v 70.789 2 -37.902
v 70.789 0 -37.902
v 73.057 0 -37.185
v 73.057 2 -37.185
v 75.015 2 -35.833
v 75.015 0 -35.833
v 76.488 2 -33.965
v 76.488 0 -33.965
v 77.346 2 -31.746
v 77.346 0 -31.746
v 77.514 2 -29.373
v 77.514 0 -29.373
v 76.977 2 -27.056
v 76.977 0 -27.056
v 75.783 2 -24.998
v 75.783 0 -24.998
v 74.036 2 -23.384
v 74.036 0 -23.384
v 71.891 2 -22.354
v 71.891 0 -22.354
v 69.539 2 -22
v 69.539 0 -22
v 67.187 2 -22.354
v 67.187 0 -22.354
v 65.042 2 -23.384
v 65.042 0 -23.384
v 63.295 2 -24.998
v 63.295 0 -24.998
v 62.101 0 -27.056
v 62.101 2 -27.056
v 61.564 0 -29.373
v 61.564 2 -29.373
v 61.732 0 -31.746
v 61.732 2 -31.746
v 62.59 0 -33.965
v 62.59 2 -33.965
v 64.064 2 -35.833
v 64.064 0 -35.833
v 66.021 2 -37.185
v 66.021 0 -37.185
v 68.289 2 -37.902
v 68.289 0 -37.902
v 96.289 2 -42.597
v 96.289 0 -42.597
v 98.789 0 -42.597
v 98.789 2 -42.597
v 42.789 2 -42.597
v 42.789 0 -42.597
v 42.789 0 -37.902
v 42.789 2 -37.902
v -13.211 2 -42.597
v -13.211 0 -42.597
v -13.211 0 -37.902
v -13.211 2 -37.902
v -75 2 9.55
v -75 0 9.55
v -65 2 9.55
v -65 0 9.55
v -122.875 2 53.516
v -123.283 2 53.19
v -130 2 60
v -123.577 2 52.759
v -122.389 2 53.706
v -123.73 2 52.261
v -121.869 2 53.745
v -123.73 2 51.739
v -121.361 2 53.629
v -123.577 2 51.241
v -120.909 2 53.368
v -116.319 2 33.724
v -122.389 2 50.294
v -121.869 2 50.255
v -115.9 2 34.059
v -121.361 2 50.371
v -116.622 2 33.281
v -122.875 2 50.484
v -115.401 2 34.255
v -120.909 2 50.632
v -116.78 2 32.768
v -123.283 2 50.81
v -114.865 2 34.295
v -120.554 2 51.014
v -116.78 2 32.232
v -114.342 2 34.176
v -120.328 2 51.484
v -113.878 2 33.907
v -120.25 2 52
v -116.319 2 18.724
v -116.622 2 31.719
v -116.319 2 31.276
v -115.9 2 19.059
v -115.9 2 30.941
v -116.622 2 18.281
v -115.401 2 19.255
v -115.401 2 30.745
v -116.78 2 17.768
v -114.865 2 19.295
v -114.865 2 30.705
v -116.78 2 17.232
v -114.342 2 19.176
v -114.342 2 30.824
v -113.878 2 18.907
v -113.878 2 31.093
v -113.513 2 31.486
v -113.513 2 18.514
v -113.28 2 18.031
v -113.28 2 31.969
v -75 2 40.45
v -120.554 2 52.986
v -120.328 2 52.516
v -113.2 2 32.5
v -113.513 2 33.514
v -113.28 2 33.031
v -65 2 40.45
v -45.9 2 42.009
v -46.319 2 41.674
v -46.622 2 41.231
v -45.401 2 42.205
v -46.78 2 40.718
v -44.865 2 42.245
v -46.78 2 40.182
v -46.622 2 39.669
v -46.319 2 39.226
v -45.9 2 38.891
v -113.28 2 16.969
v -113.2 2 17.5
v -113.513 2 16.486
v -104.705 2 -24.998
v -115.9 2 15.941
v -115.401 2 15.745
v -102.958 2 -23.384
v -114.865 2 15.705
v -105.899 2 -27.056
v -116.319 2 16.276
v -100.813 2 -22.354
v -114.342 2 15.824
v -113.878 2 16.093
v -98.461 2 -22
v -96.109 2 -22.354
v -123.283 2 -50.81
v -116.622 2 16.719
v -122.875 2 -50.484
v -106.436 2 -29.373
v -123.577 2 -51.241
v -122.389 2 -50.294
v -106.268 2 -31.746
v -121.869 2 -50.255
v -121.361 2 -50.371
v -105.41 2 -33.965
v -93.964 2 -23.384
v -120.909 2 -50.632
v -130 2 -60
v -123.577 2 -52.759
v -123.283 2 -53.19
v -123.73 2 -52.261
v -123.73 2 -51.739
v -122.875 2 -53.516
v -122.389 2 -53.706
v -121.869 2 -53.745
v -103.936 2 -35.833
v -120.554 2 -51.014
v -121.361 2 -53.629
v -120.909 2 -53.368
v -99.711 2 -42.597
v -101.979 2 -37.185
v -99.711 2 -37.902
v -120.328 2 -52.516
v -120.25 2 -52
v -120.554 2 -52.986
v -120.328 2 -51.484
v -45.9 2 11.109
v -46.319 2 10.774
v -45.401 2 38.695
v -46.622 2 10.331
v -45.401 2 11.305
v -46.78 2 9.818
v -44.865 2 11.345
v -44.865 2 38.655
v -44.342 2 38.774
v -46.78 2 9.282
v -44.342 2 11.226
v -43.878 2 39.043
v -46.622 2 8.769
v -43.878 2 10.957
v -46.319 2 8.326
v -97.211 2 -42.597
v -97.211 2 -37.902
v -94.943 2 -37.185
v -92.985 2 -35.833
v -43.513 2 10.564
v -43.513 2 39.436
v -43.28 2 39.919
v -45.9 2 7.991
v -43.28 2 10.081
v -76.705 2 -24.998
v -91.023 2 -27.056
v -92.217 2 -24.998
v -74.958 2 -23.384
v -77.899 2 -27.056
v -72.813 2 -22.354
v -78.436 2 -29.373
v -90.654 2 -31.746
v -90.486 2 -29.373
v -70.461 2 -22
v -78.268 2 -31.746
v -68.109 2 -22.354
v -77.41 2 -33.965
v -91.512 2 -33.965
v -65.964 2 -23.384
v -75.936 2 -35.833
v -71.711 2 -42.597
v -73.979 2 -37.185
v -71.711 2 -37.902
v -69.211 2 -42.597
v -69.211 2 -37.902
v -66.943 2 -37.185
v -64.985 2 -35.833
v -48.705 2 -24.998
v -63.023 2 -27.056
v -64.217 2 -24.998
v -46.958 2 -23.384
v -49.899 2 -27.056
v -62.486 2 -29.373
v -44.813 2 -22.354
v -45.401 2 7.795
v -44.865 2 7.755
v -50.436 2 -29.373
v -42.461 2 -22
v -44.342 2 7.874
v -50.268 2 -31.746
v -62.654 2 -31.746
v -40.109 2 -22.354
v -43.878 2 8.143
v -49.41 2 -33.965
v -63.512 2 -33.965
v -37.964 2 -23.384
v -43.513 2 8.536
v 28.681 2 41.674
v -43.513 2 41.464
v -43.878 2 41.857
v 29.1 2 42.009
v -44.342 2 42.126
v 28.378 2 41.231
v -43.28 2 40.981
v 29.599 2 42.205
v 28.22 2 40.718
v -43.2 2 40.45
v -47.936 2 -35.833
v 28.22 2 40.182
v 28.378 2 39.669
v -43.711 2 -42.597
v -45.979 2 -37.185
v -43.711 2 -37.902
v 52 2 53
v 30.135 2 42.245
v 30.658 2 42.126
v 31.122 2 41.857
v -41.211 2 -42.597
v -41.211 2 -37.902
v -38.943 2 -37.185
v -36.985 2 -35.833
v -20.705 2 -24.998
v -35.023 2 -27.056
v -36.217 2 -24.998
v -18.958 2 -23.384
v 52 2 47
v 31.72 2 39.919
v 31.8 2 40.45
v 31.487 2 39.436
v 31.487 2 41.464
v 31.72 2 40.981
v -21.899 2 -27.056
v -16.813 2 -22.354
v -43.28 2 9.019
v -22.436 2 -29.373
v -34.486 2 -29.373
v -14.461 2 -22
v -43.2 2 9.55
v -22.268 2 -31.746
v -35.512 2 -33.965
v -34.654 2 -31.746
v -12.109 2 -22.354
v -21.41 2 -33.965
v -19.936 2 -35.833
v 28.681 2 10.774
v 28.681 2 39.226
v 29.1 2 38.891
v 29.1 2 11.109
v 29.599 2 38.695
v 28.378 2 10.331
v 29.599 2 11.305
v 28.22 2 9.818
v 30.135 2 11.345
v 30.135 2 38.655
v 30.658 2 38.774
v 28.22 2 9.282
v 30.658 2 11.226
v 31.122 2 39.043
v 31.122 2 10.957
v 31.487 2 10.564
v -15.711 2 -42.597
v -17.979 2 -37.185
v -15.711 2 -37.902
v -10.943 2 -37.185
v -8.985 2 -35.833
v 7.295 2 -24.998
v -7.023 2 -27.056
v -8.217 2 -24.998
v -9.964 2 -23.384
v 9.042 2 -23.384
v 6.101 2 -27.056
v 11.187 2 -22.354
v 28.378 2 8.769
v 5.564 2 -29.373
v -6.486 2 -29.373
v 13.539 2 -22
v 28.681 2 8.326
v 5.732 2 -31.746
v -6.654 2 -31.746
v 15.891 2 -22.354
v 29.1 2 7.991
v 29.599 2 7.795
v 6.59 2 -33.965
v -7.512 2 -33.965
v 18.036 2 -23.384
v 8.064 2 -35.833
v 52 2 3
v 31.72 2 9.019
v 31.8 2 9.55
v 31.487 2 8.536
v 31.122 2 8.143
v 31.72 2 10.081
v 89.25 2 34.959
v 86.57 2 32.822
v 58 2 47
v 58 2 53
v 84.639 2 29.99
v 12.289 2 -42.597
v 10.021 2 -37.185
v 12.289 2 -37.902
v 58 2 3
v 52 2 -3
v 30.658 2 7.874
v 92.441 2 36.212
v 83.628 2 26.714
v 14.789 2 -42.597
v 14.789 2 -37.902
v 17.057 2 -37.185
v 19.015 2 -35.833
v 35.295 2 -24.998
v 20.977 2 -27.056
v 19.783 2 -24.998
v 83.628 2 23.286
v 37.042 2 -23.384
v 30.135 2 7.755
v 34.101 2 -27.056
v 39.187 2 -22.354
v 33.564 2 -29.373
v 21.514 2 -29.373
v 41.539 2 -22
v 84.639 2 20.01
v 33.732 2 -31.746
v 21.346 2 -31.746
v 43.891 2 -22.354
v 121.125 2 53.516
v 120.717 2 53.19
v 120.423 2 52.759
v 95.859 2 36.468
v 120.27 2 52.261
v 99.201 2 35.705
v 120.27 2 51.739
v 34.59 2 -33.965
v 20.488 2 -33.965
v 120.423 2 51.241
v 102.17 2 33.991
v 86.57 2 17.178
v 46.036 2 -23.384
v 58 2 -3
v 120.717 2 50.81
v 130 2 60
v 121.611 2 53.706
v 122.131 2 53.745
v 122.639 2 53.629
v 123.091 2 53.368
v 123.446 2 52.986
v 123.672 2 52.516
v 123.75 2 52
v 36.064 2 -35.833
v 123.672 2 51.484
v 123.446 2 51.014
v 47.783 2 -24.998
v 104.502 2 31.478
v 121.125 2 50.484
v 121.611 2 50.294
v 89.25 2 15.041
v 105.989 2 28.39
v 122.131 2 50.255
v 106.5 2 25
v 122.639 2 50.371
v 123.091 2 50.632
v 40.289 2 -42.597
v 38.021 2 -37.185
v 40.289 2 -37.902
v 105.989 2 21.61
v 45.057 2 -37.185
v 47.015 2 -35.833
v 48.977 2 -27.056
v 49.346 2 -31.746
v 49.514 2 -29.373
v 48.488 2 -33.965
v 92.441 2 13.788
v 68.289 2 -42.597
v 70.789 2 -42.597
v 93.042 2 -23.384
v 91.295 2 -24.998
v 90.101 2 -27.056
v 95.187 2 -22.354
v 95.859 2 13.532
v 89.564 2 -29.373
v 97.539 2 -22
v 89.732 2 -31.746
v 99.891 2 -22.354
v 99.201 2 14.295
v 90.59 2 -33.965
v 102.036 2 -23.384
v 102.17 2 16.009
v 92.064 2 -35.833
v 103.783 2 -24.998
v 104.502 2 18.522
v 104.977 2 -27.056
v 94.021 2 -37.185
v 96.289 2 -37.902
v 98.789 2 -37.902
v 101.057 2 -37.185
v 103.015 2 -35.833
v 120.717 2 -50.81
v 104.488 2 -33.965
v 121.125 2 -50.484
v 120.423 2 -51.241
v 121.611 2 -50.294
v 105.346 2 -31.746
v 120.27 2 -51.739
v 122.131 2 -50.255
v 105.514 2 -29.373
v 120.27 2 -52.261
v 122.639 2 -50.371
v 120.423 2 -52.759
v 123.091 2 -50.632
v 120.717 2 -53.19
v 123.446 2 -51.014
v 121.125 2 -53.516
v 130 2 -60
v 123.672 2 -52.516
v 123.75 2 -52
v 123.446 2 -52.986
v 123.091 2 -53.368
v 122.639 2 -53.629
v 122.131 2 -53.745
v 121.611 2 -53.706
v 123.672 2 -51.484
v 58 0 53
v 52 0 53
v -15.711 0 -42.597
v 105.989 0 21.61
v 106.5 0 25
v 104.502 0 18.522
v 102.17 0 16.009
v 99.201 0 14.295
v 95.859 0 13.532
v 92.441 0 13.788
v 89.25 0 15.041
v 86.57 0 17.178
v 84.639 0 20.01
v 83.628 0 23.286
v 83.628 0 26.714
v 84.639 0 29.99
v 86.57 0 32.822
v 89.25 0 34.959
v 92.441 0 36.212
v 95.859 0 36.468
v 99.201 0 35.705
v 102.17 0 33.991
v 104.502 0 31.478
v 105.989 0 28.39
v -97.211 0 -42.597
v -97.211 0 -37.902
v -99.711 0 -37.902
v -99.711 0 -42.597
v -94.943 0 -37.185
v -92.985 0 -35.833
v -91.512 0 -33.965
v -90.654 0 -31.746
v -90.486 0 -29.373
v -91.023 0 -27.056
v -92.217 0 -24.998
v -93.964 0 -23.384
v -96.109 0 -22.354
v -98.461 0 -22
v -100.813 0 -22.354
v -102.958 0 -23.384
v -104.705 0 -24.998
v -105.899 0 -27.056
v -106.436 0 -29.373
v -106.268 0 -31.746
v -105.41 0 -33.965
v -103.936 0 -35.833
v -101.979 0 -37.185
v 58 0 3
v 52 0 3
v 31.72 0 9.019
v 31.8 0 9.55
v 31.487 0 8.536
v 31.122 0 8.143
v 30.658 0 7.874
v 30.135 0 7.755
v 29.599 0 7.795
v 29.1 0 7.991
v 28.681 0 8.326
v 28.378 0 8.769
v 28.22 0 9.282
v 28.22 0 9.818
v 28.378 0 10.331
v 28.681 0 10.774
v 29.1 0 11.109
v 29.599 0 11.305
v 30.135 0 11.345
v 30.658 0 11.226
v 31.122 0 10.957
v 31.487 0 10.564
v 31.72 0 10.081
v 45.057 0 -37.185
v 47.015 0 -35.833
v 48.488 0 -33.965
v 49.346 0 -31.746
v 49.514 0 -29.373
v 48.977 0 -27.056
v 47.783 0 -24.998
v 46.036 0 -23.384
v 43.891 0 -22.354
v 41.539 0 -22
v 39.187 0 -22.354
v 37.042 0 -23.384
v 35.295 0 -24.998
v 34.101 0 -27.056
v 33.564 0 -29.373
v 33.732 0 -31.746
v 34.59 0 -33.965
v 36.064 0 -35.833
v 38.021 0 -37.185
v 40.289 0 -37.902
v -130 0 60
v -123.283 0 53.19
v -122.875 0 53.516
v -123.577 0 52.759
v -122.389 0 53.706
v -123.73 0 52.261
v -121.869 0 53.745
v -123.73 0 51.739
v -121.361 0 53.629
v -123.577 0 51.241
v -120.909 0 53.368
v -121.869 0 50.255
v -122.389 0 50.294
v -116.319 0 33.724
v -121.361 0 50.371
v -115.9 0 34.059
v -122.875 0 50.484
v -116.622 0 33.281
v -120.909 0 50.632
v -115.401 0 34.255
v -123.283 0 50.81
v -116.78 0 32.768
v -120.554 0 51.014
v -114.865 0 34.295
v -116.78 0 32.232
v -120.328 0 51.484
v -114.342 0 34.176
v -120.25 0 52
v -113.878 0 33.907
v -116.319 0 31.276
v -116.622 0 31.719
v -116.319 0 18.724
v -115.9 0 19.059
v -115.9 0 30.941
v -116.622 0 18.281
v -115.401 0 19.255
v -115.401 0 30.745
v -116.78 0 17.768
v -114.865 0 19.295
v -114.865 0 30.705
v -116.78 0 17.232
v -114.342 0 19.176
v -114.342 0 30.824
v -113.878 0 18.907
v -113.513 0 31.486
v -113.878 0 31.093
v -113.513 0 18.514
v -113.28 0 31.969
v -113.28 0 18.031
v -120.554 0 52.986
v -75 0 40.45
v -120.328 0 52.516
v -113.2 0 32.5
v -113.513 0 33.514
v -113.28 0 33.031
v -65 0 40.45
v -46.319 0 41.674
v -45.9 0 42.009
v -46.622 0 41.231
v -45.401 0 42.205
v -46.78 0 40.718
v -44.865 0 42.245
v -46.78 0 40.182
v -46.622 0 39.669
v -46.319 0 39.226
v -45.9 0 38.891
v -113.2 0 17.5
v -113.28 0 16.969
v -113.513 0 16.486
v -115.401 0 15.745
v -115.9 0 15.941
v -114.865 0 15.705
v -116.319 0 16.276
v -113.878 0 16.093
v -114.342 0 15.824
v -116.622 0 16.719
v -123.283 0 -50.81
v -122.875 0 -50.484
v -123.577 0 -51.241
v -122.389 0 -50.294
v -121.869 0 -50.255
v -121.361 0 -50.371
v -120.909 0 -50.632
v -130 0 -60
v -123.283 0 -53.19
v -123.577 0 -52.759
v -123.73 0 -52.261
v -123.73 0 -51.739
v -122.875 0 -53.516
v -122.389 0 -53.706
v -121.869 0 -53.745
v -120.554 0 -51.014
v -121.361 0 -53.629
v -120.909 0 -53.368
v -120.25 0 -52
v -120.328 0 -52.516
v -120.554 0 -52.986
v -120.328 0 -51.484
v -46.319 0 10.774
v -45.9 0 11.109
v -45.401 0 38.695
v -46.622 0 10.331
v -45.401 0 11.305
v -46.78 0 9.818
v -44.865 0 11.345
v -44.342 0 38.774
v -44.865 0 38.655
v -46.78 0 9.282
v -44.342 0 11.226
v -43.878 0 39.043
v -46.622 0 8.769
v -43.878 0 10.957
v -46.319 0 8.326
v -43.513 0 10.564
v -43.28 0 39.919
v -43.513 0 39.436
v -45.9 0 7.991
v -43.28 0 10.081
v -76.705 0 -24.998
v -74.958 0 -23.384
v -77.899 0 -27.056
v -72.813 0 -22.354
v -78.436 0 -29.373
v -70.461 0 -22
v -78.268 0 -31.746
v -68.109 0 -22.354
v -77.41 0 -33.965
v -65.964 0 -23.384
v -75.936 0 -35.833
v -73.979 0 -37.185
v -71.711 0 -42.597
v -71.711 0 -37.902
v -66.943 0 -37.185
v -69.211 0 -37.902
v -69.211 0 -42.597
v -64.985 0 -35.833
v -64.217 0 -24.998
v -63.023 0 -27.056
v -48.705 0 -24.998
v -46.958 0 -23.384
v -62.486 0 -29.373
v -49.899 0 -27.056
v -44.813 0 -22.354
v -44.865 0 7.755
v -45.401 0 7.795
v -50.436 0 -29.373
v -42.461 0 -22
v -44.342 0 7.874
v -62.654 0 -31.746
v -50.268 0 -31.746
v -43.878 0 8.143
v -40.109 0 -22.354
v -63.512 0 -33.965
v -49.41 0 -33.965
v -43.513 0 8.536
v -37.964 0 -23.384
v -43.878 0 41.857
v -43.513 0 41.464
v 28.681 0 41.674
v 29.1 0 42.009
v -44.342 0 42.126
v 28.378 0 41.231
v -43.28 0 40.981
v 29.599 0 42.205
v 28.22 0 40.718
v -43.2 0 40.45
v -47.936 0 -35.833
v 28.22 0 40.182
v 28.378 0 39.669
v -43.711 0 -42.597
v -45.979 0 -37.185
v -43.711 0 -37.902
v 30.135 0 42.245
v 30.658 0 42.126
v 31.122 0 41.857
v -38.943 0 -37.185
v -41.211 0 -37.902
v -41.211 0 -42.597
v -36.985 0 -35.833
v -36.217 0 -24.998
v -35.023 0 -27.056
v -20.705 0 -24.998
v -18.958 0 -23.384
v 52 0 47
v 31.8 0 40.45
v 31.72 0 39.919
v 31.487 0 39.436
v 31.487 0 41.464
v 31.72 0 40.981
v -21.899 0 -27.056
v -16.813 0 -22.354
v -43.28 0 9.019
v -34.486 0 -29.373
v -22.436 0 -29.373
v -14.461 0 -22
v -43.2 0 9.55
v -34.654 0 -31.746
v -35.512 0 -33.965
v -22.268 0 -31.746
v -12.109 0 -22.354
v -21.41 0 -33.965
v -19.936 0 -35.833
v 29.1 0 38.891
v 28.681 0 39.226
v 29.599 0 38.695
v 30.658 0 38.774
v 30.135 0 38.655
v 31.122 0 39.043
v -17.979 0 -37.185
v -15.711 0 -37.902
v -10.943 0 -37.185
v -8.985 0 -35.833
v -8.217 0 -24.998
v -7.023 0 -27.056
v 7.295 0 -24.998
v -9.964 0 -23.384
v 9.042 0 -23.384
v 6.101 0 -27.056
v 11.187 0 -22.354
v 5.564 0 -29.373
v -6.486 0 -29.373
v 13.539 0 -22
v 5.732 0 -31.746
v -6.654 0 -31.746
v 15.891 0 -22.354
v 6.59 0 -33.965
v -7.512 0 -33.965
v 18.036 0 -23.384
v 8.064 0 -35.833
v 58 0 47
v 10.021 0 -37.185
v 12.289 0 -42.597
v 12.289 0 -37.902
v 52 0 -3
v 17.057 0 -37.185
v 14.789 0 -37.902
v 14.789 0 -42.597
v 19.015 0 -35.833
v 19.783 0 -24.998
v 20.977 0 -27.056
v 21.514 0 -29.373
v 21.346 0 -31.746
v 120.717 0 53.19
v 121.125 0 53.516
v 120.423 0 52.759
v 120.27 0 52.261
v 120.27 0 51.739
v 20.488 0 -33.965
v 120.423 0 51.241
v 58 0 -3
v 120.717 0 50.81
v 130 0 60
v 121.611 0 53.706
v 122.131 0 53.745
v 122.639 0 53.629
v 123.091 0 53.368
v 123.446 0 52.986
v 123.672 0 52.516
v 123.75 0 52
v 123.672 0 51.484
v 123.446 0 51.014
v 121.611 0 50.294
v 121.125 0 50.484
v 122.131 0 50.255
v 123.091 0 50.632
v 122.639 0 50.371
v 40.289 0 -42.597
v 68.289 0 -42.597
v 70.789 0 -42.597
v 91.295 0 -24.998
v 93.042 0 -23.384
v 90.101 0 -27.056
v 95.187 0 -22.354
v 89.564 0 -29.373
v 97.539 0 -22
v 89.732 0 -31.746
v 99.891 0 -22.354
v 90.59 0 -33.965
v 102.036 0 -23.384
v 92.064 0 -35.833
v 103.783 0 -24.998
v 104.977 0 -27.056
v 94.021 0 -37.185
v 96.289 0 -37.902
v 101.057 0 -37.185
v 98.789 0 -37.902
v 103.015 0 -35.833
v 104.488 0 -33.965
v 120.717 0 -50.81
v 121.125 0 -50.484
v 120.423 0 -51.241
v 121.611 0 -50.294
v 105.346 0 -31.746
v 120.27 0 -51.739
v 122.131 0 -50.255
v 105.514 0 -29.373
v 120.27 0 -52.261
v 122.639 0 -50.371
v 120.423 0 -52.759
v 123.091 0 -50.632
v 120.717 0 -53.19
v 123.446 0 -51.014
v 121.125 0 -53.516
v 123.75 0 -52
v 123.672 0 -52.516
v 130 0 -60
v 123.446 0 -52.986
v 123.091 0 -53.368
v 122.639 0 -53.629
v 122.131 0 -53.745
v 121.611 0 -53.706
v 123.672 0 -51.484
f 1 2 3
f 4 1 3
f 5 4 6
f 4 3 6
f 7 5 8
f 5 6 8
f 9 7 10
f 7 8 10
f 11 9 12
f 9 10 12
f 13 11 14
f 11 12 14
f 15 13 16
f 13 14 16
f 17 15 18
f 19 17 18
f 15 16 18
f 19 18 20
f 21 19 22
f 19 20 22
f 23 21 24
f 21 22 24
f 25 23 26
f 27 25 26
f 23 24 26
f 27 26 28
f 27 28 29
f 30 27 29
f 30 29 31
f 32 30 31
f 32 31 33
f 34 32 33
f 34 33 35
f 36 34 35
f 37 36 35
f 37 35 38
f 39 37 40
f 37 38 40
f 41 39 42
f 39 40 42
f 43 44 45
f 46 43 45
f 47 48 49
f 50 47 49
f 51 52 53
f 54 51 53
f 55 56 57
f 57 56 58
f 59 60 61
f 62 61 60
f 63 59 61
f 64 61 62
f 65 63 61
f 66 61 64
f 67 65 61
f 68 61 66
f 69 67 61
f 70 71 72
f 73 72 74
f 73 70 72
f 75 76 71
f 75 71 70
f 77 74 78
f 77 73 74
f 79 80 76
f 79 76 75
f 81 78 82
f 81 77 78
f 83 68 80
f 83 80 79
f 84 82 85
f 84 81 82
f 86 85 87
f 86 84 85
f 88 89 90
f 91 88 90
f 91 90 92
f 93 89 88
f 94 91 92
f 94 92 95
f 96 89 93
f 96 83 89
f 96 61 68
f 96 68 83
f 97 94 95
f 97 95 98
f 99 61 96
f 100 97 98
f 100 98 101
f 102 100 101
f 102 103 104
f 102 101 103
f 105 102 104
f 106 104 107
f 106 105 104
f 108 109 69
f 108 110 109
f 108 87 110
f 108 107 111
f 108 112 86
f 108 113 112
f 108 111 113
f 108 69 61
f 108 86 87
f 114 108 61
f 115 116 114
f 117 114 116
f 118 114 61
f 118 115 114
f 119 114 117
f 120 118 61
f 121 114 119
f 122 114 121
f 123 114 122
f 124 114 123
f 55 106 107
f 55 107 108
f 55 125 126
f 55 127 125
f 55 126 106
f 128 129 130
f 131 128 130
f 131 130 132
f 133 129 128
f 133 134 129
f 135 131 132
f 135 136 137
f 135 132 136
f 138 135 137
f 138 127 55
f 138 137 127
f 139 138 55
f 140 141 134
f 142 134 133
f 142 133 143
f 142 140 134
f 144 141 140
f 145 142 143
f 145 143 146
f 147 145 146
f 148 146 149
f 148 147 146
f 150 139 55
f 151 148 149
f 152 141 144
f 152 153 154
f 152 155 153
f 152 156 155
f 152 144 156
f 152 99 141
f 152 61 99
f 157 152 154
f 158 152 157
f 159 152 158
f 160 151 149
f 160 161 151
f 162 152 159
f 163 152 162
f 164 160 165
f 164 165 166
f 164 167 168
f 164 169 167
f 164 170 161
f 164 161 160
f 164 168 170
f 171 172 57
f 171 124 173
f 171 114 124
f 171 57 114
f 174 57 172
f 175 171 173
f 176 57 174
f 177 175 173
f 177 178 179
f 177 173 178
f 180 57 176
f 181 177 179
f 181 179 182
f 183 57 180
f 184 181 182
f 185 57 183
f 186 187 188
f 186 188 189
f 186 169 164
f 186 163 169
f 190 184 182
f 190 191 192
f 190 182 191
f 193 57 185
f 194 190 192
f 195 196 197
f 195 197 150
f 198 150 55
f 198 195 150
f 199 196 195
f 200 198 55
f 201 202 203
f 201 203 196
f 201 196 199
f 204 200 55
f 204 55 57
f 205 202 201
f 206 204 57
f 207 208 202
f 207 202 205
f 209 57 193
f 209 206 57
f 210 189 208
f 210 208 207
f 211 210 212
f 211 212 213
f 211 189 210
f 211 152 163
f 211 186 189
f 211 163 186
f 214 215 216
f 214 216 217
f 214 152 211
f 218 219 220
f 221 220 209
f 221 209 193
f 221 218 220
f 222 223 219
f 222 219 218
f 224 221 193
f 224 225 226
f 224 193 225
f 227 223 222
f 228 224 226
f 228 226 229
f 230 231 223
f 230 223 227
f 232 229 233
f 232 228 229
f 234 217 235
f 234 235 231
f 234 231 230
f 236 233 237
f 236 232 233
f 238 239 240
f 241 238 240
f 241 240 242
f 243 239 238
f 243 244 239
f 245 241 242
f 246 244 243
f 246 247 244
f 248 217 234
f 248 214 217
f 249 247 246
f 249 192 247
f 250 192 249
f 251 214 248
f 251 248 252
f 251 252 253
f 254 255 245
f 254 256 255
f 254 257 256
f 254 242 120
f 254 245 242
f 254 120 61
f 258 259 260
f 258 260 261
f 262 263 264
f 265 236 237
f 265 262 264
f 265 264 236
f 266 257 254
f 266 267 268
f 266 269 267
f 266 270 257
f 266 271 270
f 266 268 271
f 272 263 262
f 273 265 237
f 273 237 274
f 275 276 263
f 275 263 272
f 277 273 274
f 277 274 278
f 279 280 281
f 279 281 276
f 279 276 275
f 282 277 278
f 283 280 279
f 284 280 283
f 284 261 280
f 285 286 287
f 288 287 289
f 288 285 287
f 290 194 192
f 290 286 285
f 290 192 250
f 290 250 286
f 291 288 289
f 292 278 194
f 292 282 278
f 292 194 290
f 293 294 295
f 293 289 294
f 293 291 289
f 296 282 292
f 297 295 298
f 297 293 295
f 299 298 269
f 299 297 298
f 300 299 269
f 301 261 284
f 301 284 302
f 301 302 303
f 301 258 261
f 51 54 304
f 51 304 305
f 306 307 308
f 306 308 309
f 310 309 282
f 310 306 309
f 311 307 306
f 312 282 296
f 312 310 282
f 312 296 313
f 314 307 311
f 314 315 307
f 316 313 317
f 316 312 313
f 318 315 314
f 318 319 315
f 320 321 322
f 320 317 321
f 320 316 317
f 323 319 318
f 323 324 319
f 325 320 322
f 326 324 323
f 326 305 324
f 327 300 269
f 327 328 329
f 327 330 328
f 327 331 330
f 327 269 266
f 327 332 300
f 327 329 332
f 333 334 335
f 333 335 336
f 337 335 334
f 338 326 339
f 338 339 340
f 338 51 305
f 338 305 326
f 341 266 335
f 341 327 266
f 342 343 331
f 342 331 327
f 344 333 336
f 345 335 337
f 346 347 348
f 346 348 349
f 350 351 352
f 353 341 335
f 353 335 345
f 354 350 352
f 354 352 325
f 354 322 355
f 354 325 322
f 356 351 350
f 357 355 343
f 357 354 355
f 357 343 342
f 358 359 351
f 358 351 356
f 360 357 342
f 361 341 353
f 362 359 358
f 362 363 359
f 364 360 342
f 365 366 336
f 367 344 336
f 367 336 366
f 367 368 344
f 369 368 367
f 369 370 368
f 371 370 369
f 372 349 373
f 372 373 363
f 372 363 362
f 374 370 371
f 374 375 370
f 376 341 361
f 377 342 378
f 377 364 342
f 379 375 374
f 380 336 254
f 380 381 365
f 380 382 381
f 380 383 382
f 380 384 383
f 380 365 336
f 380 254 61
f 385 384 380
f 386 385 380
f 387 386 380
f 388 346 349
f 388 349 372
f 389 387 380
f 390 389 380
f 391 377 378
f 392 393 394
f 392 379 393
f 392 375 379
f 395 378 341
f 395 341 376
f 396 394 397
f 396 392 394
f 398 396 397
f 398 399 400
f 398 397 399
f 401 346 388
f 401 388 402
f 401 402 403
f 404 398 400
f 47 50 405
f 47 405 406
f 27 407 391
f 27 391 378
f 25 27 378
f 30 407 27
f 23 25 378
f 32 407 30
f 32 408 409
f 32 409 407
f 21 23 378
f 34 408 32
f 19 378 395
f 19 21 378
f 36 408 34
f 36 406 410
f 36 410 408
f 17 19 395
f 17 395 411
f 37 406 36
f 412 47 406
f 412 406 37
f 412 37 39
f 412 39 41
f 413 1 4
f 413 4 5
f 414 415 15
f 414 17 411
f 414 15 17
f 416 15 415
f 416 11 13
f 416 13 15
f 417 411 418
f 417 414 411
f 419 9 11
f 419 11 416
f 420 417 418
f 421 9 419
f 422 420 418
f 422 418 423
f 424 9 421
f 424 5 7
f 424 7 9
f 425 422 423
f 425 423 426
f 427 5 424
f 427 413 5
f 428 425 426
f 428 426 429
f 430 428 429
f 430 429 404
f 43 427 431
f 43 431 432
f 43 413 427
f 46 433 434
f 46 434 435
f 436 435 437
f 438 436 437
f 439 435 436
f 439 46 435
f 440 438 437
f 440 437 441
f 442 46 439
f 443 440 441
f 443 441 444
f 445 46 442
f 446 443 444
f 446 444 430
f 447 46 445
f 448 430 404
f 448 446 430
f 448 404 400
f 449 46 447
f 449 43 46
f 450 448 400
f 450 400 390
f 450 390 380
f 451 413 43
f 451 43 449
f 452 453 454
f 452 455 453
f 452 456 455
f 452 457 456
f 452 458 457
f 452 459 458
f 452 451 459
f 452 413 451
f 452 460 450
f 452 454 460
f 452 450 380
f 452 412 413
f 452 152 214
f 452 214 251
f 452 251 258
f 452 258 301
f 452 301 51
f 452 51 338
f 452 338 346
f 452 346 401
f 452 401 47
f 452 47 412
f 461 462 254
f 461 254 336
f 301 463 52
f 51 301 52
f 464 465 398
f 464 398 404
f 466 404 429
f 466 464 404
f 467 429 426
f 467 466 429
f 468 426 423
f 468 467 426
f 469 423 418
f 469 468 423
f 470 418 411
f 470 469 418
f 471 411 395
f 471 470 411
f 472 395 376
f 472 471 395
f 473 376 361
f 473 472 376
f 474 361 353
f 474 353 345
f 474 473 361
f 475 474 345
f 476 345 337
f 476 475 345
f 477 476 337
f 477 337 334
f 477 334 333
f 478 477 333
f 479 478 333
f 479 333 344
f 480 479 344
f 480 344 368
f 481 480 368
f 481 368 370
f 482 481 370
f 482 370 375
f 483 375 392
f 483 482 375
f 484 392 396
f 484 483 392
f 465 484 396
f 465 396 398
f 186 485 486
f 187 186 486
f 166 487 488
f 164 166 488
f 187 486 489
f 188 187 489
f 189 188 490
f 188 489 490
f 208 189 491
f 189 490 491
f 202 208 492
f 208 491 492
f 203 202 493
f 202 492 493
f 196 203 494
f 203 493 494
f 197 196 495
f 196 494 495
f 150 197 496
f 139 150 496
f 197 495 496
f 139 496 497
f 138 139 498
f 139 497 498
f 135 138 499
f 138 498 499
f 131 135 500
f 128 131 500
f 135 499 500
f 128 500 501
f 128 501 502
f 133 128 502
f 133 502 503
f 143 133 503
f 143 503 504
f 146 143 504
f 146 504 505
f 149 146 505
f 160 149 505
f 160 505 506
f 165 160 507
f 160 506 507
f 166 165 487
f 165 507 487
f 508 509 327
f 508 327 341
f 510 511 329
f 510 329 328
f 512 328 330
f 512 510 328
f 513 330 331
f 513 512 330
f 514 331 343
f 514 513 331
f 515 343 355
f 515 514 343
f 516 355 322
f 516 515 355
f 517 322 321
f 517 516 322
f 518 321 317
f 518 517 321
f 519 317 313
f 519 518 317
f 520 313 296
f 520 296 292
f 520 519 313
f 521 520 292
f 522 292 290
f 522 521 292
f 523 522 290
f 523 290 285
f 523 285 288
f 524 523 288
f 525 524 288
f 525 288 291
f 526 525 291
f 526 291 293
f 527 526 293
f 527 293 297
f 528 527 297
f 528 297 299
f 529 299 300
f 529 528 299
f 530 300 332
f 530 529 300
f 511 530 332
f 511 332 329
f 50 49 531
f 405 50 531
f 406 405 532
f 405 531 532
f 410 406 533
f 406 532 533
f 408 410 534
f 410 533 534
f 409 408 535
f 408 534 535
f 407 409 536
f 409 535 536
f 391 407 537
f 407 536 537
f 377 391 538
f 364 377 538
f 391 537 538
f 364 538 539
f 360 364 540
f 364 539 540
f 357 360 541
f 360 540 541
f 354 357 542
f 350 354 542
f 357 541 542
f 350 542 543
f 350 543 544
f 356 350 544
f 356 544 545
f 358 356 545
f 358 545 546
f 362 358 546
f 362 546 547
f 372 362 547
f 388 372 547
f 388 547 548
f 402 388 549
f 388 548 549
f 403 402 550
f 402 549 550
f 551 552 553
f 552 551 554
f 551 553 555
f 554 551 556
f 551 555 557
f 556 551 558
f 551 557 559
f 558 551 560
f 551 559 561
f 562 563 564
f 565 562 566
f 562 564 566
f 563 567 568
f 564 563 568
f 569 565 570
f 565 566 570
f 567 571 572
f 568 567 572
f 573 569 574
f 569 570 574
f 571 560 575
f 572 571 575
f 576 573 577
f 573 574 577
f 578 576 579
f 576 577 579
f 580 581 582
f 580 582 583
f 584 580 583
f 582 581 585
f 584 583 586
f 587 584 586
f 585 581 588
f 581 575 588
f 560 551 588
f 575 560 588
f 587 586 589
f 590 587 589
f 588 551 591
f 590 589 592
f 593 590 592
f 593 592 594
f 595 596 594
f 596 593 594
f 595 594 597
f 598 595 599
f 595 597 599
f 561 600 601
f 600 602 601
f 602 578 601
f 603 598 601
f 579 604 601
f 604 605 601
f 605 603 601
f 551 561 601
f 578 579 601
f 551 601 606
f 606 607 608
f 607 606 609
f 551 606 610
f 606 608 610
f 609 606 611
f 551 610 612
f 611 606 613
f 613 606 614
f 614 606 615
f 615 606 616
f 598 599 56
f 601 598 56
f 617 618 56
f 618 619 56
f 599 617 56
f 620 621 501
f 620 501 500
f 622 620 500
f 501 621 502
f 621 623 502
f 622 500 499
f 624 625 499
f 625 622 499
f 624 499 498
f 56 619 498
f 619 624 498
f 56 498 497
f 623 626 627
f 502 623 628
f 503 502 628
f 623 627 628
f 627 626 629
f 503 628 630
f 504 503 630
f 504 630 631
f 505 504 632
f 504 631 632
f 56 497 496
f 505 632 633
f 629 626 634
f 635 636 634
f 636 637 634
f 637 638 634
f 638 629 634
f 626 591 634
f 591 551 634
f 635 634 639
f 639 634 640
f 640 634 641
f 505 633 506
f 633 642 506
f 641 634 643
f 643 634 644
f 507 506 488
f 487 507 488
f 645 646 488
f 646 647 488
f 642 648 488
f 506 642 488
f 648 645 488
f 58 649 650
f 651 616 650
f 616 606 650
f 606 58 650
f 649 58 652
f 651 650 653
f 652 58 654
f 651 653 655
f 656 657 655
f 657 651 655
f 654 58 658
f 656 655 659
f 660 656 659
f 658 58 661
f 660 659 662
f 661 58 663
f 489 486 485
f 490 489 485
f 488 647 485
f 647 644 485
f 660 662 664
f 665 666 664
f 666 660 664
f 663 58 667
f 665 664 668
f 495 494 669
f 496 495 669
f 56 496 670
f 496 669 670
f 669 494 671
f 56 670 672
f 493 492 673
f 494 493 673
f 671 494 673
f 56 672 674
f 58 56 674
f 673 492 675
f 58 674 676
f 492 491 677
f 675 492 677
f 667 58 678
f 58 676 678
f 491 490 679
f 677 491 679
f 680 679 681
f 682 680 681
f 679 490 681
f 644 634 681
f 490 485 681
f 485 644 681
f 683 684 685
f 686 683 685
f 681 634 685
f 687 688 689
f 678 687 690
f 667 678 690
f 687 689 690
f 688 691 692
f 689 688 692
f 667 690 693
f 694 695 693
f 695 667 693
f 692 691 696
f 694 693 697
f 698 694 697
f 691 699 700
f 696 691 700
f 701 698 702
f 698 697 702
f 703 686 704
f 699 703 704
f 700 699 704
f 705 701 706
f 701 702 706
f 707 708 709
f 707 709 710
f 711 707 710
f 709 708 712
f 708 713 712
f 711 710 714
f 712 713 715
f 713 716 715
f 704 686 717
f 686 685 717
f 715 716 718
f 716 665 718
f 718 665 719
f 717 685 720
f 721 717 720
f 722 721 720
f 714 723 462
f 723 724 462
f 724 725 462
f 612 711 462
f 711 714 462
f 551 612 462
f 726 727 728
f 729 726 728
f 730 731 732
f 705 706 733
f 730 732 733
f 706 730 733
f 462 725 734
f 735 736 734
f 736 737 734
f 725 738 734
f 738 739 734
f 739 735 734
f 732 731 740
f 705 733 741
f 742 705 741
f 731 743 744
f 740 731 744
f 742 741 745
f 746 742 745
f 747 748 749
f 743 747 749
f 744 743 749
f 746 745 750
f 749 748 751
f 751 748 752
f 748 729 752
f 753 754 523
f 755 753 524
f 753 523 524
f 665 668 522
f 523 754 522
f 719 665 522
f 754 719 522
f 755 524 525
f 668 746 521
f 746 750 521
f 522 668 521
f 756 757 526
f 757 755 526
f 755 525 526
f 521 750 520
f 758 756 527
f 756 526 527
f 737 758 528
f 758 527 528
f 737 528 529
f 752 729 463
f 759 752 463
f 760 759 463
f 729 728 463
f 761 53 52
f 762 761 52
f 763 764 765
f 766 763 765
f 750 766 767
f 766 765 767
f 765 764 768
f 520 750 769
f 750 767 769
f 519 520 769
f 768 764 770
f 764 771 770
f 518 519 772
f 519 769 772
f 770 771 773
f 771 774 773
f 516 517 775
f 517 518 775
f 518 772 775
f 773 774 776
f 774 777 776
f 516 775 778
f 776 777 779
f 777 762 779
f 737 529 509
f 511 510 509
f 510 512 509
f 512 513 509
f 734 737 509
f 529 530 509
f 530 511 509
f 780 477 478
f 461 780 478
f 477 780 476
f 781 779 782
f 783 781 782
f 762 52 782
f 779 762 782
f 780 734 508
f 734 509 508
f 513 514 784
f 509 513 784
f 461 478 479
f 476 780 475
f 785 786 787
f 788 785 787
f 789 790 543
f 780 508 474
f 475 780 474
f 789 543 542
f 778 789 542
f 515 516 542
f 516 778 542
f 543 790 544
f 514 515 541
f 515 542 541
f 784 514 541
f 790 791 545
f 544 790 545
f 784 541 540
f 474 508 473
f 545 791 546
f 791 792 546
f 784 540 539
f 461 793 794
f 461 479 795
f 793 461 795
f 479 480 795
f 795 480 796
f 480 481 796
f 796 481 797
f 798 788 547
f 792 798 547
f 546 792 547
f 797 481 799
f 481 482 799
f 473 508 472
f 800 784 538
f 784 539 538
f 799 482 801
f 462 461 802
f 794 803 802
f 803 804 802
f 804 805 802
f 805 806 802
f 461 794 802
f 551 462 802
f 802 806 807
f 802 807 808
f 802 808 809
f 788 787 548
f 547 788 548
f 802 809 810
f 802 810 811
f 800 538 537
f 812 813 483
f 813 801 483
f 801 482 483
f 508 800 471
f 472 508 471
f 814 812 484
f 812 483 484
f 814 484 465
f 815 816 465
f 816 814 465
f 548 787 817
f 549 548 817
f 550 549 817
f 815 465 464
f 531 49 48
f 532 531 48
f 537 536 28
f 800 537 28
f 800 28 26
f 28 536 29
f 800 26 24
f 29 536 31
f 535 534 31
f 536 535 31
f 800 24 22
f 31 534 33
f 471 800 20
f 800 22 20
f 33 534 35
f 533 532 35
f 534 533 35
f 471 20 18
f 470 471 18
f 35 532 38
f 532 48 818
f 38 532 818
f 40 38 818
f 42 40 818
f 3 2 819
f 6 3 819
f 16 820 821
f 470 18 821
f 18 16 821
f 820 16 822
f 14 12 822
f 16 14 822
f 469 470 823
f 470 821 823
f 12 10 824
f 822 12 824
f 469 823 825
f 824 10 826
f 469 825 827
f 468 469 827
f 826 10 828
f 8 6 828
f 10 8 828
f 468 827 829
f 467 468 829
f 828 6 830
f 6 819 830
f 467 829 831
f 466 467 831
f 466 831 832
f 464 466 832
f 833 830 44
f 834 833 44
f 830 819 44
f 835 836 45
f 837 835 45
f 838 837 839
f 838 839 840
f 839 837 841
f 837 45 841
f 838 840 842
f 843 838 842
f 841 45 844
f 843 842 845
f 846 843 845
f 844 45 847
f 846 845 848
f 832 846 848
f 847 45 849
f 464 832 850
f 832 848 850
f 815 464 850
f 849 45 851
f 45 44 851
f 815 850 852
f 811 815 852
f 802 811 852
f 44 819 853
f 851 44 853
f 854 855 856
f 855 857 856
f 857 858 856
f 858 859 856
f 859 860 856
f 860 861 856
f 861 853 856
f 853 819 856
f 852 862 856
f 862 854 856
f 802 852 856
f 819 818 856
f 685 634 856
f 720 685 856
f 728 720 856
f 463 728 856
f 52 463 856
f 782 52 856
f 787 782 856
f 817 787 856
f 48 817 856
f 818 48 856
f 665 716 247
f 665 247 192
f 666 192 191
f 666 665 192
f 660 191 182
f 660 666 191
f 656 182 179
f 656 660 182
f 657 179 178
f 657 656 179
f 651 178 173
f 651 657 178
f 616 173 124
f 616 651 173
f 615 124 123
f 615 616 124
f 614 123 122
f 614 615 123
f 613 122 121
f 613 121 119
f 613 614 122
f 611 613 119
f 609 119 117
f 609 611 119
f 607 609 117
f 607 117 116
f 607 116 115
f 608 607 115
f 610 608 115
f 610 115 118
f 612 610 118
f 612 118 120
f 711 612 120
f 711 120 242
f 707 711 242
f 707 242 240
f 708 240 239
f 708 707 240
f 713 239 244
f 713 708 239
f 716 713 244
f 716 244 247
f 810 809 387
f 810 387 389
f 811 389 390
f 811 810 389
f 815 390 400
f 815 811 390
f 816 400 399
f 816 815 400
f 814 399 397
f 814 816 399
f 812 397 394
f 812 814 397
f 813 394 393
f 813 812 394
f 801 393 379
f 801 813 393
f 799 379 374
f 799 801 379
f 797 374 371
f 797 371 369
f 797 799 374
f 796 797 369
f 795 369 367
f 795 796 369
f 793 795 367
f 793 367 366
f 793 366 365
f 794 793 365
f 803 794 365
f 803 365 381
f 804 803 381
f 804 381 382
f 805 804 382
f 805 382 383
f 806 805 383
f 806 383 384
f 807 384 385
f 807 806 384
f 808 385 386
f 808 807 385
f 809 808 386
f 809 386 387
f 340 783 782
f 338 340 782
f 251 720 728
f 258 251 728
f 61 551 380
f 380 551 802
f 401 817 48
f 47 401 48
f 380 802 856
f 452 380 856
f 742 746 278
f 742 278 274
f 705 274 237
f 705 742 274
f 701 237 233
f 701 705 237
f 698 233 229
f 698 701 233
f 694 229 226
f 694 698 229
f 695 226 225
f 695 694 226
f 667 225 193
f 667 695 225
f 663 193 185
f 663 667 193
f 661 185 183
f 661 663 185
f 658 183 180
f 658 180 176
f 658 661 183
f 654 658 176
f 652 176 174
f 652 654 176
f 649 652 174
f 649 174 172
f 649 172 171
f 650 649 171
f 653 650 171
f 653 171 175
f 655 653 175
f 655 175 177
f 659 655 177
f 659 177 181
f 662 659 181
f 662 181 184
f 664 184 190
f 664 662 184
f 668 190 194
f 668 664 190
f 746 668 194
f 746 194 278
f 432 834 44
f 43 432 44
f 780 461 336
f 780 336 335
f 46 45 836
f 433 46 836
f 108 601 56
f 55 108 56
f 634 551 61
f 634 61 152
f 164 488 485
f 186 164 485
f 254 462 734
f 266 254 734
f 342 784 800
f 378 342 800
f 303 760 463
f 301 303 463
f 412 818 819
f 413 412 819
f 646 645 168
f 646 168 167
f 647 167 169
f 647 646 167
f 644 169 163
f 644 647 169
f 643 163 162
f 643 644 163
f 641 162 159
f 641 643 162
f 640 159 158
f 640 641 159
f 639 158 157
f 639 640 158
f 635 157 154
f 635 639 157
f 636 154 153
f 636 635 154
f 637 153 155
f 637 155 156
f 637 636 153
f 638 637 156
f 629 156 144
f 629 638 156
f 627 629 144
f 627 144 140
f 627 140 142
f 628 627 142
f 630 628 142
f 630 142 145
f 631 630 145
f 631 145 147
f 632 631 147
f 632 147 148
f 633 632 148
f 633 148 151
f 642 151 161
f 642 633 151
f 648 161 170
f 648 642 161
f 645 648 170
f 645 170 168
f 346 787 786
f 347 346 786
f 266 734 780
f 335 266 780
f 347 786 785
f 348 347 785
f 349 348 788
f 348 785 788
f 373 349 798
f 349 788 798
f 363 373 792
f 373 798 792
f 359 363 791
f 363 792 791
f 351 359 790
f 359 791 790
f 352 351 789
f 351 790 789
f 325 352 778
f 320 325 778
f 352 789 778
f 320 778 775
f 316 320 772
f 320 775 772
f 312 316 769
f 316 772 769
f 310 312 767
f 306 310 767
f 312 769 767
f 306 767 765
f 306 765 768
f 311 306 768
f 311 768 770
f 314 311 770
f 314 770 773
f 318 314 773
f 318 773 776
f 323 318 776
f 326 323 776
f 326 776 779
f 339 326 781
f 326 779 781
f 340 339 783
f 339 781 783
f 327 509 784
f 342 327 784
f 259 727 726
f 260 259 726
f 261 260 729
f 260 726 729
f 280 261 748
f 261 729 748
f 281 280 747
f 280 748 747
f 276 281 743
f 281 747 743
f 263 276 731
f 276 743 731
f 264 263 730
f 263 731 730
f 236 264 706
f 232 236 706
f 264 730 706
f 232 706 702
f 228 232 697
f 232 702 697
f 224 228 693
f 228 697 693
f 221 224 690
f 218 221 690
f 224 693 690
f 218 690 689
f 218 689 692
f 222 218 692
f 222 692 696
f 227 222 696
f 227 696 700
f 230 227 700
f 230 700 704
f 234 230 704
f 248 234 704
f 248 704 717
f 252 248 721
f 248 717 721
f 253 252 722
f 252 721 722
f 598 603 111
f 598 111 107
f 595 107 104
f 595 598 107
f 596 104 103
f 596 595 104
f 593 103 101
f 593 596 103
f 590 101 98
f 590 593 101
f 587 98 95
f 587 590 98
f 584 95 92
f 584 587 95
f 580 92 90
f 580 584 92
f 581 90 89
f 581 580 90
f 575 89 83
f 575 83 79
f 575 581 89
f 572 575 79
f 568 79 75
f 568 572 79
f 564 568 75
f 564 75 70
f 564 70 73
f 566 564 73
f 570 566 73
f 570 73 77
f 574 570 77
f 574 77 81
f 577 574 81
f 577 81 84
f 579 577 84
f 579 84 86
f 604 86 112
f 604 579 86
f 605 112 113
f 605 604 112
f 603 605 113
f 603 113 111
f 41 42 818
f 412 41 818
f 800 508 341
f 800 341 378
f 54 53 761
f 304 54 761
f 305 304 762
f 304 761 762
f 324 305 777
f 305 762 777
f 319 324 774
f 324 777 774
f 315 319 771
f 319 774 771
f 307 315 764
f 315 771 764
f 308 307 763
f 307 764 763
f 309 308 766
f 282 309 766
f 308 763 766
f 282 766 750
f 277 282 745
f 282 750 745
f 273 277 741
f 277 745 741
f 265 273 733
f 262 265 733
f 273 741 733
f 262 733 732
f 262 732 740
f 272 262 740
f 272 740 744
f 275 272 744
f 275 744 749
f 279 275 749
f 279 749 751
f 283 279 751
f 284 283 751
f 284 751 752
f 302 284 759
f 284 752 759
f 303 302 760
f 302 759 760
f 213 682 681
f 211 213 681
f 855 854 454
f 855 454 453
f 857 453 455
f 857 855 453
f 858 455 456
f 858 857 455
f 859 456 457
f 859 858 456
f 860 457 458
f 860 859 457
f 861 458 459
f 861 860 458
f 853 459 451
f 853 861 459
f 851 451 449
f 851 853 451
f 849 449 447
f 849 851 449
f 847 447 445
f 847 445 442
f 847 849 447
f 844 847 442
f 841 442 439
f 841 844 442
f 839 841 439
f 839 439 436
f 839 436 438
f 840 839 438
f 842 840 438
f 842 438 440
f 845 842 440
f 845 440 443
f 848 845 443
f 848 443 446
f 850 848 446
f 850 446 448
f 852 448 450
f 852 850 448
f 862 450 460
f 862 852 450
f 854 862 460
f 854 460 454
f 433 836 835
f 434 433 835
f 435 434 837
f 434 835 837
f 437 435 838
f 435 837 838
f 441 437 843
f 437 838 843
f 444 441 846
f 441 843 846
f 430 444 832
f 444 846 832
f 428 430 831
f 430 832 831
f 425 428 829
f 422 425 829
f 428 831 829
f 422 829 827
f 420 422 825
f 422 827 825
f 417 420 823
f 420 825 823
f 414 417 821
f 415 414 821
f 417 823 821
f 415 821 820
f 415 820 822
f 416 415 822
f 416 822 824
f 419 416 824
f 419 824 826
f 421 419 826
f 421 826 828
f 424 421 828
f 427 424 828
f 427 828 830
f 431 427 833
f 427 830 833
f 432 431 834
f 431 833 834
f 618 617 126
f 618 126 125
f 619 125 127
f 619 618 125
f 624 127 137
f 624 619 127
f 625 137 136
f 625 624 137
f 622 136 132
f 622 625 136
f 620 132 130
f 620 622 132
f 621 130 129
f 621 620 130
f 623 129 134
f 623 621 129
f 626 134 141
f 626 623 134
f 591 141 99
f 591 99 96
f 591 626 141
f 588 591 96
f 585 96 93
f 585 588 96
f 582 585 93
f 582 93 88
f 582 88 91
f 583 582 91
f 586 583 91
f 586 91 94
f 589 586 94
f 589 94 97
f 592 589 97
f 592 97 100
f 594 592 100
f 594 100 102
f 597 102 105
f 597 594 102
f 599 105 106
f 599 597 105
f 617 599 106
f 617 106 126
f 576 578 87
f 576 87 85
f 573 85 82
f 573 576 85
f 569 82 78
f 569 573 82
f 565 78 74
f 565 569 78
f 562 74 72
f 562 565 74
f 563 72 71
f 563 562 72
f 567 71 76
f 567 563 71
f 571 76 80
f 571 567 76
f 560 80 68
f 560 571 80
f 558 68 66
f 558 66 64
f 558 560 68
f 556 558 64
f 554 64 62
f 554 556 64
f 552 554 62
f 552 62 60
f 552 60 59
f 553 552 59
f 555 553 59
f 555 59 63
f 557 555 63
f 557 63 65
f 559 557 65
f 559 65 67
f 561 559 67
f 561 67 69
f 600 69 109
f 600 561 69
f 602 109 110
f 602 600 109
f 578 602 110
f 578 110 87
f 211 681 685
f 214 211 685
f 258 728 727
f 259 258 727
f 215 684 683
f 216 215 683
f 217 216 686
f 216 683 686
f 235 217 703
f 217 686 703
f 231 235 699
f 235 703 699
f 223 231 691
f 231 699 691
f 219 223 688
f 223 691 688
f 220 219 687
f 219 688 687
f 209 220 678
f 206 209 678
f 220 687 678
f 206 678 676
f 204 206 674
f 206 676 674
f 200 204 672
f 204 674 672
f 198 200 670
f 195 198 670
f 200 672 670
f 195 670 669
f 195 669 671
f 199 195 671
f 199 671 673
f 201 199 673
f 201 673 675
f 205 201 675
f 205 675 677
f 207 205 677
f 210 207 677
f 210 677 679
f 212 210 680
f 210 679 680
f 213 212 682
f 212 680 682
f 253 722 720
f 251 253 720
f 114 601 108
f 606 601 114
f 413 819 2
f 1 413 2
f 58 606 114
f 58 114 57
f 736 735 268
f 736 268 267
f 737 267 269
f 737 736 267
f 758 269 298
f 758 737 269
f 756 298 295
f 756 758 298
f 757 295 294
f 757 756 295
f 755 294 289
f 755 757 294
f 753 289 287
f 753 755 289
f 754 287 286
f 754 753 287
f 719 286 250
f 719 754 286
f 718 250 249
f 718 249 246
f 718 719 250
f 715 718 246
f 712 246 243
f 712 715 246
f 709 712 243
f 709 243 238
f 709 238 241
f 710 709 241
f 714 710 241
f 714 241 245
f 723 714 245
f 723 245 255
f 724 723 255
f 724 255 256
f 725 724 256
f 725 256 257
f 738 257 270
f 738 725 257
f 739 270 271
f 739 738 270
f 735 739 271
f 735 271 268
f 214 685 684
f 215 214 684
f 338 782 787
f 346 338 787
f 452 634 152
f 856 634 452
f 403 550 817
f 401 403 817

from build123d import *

# Parameters (mm, degrees)
SKETCH_1_W      = 260
SKETCH_1_H      = 120
SKETCH_1_R      = 1.8
SKETCH_1_R_2    = 11.5
SKETCH_1_R_3    = 1.75
SKETCH_1_W_2    = 10
SKETCH_1_H_2    = 30.9
SKETCH_1_W_3    = 6
SKETCH_1_H_3    = 6
EXTRUDE_1_DEPTH = 2


with BuildPart() as part:
    # 草圖1 → 填料-伸長1 (new body)
    with BuildSketch(Plane(origin=(0, 0, 0), x_dir=(1, 0, 0), z_dir=(0, 1, 0))):
        Rectangle(SKETCH_1_W, SKETCH_1_H)
        with Locations((-45, -9.55)):
            Circle(SKETCH_1_R, mode=Mode.SUBTRACT)
        with Locations((-45, -40.45)):
            Circle(SKETCH_1_R, mode=Mode.SUBTRACT)
        with Locations((30, -9.55)):
            Circle(SKETCH_1_R, mode=Mode.SUBTRACT)
        with Locations((30, -40.45)):
            Circle(SKETCH_1_R, mode=Mode.SUBTRACT)
        with Locations((95, -25)):
            Circle(SKETCH_1_R_2, mode=Mode.SUBTRACT)
        with Locations((-122, 52)):
            Circle(SKETCH_1_R_3, mode=Mode.SUBTRACT)
        with Locations((-122, -52)):
            Circle(SKETCH_1_R_3, mode=Mode.SUBTRACT)
        with Locations((122, 52)):
            Circle(SKETCH_1_R_3, mode=Mode.SUBTRACT)
        with Locations((122, -52)):
            Circle(SKETCH_1_R_3, mode=Mode.SUBTRACT)
        with Locations((-115, -17.5)):
            Circle(SKETCH_1_R, mode=Mode.SUBTRACT)
        with Locations((-115, -32.5)):
            Circle(SKETCH_1_R, mode=Mode.SUBTRACT)
        with Locations((-70, -25)):
            Rectangle(SKETCH_1_W_2, SKETCH_1_H_2, mode=Mode.SUBTRACT)
        with Locations((55, -50)):
            Rectangle(SKETCH_1_W_3, SKETCH_1_H_3, mode=Mode.SUBTRACT)
        with Locations((55, 0)):
            Rectangle(SKETCH_1_W_3, SKETCH_1_H_3, mode=Mode.SUBTRACT)
        with BuildLine():
            Line((-71.710967932, 42.596685205), (-69.210967932, 42.596685205))
            Line((-69.210967932, 42.596685205), (-69.210967932, 37.901740315))
            ThreePointArc((-69.210967932, 37.901740315), (-70.460967932, 22), (-71.710967932, 37.901740315))
            Line((-71.710967932, 37.901740315), (-71.710967932, 42.596685205))
        make_face(mode=Mode.SUBTRACT)
        with BuildLine():
            Line((-99.710967932, 42.596685205), (-97.210967932, 42.596685205))
            Line((-97.210967932, 42.596685205), (-97.210967932, 37.901740315))
            ThreePointArc((-97.210967932, 37.901740315), (-98.460967932, 22), (-99.710967932, 37.901740315))
            Line((-99.710967932, 37.901740315), (-99.710967932, 42.596685205))
        make_face(mode=Mode.SUBTRACT)
        with BuildLine():
            Line((-43.710967932, 42.596685205), (-41.210967932, 42.596685205))
            Line((-41.210967932, 42.596685205), (-41.210967932, 37.901740315))
            ThreePointArc((-41.210967932, 37.901740315), (-42.460967932, 22), (-43.710967932, 37.901740315))
            Line((-43.710967932, 37.901740315), (-43.710967932, 42.596685205))
        make_face(mode=Mode.SUBTRACT)
        with BuildLine():
            Line((-15.710967932, 42.596685205), (-13.210967932, 42.596685205))
            Line((-13.210967932, 42.596685205), (-13.210967932, 37.901740315))
            ThreePointArc((-13.210967932, 37.901740315), (-14.460967932, 22), (-15.710967932, 37.901740315))
            Line((-15.710967932, 37.901740315), (-15.710967932, 42.596685205))
        make_face(mode=Mode.SUBTRACT)
        with BuildLine():
            Line((12.289032068, 42.596685205), (14.789032068, 42.596685205))
            Line((14.789032068, 42.596685205), (14.789032068, 37.901740315))
            ThreePointArc((14.789032068, 37.901740315), (13.539032068, 22), (12.289032068, 37.901740315))
            Line((12.289032068, 37.901740315), (12.289032068, 42.596685205))
        make_face(mode=Mode.SUBTRACT)
        with BuildLine():
            Line((40.289032068, 42.596685205), (42.789032068, 42.596685205))
            Line((42.789032068, 42.596685205), (42.789032068, 37.901740315))
            ThreePointArc((42.789032068, 37.901740315), (41.539032068, 22), (40.289032068, 37.901740315))
            Line((40.289032068, 37.901740315), (40.289032068, 42.596685205))
        make_face(mode=Mode.SUBTRACT)
        with BuildLine():
            Line((68.289032068, 42.596685205), (70.789032068, 42.596685205))
            Line((70.789032068, 42.596685205), (70.789032068, 37.901740315))
            ThreePointArc((70.789032068, 37.901740315), (69.539032068, 22), (68.289032068, 37.901740315))
            Line((68.289032068, 37.901740315), (68.289032068, 42.596685205))
        make_face(mode=Mode.SUBTRACT)
        with BuildLine():
            Line((96.289032068, 42.596685205), (98.789032068, 42.596685205))
            Line((98.789032068, 42.596685205), (98.789032068, 37.901740315))
            ThreePointArc((98.789032068, 37.901740315), (97.539032068, 22), (96.289032068, 37.901740315))
            Line((96.289032068, 37.901740315), (96.289032068, 42.596685205))
        make_face(mode=Mode.SUBTRACT)
    extrude(amount=EXTRUDE_1_DEPTH)


solid = part.part
